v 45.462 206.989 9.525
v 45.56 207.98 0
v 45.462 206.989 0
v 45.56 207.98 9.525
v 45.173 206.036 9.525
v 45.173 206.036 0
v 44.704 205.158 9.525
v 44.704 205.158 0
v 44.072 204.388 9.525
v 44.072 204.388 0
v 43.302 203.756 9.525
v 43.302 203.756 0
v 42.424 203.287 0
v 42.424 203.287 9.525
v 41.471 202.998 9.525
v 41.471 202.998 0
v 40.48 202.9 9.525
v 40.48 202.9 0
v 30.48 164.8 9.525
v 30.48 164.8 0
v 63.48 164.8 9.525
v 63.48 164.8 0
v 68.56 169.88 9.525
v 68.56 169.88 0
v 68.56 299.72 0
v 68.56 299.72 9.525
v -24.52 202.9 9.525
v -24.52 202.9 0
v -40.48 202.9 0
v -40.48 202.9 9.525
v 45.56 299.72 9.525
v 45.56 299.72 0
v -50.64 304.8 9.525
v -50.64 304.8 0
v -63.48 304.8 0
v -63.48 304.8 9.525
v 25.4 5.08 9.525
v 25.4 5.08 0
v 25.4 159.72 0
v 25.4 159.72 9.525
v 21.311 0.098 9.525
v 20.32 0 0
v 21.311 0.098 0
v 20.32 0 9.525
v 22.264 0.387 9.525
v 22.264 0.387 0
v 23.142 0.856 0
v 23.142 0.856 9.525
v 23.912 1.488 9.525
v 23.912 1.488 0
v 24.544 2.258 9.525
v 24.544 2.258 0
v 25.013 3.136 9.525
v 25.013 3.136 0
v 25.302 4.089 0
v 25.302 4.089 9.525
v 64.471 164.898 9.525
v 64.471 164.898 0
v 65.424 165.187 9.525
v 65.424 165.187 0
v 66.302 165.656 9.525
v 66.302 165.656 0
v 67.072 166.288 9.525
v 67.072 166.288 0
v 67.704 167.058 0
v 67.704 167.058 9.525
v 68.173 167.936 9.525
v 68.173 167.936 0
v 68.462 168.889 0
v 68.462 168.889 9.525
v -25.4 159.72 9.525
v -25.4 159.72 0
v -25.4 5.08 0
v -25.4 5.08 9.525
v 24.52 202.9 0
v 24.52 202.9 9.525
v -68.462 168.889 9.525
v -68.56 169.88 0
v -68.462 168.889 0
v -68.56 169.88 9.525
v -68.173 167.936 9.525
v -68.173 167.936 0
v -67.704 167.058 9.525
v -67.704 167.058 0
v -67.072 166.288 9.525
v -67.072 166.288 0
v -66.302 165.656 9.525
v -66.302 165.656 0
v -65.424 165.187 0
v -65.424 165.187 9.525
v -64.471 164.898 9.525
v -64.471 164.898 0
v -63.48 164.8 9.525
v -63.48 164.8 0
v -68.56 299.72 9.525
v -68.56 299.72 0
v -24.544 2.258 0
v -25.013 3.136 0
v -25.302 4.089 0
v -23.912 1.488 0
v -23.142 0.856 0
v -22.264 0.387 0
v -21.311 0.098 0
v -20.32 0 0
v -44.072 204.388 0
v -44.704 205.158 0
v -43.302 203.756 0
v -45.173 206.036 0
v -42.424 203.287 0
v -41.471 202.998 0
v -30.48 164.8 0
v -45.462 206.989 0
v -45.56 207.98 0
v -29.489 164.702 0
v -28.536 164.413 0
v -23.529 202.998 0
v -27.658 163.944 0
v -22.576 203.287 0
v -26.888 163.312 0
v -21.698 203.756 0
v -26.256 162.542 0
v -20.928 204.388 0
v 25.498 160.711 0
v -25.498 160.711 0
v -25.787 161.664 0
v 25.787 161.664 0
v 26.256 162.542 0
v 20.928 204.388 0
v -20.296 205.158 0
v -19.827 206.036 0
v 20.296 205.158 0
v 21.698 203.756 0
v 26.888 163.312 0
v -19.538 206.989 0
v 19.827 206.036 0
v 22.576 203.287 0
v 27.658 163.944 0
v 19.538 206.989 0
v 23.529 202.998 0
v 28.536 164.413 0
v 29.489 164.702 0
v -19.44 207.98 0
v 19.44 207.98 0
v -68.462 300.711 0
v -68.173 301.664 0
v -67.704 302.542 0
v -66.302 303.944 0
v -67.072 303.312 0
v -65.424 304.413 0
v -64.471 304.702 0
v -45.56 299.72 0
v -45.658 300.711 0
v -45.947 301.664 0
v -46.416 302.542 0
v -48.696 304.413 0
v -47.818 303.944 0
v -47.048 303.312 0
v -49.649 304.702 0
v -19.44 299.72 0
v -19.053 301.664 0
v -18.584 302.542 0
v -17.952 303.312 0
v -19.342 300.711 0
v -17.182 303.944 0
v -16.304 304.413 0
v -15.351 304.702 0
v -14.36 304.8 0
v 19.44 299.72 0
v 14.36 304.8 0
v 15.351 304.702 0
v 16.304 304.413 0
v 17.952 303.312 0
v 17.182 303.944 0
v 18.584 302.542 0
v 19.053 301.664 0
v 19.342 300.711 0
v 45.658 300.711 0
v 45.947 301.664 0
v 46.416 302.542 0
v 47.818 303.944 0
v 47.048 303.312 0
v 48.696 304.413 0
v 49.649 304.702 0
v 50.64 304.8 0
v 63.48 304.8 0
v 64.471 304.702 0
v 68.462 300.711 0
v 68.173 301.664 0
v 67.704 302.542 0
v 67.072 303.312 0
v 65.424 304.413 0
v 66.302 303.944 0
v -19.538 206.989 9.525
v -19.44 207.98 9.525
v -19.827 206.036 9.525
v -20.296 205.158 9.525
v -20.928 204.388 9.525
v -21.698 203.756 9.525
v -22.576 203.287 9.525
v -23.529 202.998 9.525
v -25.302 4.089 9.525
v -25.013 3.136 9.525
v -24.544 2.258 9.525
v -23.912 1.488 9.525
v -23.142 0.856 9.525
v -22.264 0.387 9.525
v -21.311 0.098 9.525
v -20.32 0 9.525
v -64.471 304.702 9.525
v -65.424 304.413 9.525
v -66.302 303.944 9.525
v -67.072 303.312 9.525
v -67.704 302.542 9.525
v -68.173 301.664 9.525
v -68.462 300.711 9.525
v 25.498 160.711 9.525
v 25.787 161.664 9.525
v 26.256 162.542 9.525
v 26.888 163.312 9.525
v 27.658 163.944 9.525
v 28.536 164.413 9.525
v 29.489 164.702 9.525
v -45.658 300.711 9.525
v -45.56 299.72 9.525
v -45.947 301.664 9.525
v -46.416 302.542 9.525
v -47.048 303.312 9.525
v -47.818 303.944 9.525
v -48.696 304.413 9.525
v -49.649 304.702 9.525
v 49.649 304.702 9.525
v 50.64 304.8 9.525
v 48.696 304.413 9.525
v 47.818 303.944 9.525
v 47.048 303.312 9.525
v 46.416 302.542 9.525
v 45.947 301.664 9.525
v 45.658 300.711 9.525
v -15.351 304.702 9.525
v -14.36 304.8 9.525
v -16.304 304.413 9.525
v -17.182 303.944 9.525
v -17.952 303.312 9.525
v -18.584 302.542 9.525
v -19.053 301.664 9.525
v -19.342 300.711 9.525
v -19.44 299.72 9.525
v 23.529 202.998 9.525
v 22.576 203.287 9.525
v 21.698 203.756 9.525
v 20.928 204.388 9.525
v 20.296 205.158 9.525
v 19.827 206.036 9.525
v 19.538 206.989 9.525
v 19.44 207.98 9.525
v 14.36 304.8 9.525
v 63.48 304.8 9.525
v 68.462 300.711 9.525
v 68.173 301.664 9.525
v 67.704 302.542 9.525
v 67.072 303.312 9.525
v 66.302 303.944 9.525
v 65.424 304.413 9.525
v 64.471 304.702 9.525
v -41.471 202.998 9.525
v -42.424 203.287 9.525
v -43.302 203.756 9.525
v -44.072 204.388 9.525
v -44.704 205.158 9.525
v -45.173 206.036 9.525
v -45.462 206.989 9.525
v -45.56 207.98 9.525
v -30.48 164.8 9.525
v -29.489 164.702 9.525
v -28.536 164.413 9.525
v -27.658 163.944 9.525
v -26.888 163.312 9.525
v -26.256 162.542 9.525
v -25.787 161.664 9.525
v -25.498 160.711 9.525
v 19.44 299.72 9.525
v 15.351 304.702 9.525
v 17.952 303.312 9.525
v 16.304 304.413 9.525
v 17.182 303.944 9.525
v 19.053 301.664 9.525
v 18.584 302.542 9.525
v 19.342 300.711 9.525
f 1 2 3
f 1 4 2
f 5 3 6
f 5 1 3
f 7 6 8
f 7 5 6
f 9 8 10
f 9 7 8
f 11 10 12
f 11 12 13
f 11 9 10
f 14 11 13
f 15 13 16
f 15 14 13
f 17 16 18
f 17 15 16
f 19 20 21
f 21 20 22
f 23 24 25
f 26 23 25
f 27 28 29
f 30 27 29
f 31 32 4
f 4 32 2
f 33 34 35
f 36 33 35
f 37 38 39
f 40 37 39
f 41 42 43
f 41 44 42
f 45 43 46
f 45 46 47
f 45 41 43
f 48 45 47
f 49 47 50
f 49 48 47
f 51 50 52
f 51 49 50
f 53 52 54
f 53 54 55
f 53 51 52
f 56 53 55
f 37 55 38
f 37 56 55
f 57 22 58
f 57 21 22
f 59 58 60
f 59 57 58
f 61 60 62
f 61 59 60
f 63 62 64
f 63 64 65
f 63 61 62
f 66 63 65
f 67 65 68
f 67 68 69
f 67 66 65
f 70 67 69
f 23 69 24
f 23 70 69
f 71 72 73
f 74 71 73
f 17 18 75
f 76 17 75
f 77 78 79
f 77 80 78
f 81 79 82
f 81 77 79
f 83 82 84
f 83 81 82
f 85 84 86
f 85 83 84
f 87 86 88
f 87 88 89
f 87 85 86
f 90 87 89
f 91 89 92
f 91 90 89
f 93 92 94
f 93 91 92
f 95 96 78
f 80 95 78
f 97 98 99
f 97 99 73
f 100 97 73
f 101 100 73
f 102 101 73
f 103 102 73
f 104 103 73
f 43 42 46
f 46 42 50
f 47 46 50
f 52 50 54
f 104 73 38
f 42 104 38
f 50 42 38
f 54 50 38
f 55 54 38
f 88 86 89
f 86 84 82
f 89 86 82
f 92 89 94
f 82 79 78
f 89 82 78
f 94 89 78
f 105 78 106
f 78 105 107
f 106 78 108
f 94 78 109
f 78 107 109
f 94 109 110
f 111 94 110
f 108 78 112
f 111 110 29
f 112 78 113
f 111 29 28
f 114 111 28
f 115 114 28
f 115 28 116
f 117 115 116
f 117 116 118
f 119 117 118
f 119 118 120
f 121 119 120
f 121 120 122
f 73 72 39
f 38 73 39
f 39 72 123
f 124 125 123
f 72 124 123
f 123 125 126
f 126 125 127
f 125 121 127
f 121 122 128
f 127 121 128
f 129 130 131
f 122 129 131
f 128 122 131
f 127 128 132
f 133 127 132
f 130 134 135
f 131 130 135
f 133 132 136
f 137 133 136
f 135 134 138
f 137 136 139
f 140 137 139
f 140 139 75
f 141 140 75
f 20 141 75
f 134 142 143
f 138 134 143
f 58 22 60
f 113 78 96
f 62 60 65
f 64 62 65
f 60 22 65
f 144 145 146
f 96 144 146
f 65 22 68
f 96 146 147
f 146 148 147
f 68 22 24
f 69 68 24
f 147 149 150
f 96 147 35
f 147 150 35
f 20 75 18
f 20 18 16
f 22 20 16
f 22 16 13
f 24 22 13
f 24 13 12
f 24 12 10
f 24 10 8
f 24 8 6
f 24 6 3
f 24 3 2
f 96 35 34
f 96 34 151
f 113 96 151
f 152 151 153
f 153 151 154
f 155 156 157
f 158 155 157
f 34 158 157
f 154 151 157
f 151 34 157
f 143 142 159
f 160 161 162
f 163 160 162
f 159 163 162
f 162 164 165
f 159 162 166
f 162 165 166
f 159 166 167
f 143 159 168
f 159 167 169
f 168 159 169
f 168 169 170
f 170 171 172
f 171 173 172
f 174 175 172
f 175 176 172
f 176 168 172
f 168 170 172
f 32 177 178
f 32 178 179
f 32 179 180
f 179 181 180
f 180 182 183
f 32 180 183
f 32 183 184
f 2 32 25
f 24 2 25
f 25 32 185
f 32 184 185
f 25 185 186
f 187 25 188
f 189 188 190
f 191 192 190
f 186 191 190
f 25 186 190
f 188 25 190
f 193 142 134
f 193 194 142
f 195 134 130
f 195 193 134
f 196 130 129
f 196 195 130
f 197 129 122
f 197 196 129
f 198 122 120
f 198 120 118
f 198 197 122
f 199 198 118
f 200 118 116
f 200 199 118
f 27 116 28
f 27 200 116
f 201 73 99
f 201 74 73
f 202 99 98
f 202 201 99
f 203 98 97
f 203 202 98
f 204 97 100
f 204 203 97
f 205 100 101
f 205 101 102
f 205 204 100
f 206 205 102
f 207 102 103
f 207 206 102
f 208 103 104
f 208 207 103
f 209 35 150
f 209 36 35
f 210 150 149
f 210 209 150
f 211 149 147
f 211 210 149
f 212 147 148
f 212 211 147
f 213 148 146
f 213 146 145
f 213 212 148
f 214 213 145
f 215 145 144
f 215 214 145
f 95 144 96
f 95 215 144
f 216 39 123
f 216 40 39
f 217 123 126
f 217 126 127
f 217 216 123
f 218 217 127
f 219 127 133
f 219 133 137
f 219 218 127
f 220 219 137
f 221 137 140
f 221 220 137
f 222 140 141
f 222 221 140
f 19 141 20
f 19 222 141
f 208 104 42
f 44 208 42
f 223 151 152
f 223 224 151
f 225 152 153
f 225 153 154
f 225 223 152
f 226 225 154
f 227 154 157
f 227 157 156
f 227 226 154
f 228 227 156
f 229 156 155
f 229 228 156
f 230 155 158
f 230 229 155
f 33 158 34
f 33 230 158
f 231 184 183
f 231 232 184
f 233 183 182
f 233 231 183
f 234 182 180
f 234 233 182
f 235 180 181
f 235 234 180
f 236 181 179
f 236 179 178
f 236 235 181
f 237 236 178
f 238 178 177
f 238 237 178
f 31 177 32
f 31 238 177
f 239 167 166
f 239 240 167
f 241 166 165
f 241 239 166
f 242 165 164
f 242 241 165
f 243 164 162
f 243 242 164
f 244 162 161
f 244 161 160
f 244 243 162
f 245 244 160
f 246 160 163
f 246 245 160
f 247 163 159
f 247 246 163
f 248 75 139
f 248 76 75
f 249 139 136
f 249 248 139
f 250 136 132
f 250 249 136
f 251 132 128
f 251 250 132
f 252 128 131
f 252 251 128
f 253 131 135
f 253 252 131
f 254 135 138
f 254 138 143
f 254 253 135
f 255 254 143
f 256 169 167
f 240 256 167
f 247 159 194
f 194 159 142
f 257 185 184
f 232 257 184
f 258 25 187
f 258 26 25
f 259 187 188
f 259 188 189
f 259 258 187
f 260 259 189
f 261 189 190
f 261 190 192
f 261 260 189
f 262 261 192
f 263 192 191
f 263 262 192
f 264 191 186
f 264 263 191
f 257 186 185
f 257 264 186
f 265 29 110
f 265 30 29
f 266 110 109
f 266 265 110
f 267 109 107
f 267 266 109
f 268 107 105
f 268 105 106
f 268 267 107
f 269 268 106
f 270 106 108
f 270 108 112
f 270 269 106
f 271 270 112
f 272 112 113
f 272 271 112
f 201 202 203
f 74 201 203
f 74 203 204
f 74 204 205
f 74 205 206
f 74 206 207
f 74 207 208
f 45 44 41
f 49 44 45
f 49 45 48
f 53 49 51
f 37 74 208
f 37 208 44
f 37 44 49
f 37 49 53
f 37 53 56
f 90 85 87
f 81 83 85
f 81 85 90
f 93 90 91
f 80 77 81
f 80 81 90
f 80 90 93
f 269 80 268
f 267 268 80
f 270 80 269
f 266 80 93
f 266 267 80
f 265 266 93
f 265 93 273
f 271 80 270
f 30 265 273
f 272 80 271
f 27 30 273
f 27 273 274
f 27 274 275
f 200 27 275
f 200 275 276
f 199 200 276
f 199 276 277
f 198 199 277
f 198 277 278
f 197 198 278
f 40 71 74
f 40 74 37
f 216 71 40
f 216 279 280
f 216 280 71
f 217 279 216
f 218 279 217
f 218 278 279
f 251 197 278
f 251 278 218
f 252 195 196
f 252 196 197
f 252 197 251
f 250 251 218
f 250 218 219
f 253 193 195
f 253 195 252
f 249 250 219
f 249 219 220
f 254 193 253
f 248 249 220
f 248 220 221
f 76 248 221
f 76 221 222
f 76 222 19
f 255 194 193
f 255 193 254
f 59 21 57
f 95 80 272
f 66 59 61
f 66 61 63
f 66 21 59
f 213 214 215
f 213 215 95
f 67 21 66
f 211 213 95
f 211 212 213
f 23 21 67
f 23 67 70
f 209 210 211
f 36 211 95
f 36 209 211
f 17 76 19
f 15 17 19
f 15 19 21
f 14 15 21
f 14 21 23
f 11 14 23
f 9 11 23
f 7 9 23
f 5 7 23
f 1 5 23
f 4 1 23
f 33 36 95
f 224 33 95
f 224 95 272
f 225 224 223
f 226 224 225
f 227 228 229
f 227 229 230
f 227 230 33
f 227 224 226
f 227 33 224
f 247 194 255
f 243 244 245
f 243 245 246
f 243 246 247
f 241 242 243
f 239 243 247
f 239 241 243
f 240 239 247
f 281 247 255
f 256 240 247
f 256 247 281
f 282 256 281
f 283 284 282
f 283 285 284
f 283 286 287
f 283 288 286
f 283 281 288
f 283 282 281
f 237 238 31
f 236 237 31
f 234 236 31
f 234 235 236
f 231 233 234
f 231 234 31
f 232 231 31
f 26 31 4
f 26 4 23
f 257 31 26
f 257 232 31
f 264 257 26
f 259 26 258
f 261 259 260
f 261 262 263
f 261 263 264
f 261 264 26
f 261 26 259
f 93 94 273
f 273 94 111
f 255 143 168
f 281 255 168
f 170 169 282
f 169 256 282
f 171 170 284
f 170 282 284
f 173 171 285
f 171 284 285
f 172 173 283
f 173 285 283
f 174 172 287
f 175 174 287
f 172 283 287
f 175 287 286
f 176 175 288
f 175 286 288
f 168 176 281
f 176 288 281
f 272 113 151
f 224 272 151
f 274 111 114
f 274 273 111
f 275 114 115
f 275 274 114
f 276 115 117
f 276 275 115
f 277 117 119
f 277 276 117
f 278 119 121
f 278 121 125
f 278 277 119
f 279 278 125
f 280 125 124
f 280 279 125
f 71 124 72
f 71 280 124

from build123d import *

# Parameters (mm, degrees)
F1_DEPTH = 9.525
F2_R     = 5.08


# Not quite as in the source:
# - a length typed as a fraction of an inch, garbled in the dataset ("3 / 203.2 mm" for 3/8 in), is restored


with BuildPart() as f1:
    # F0 (on Top) → F1 (new body)
    with BuildSketch(Plane.XY):
        Polygon((19.44, 304.8), (0, 304.8), (-19.44, 304.8), (-19.44, 202.9), (-45.56, 202.9), (-45.56, 304.8), (-68.56, 304.8), (-68.56, 164.8), (-25.4, 164.8), (-25.4, 0), (0, 0), (25.4, 0), (25.4, 164.8), (68.56, 164.8), (68.56, 304.8), (45.56, 304.8), (45.56, 202.9), (19.44, 202.9), align=None)
    extrude(amount=F1_DEPTH)

    # F2
    f2_edges = [f1.edges().sort_by_distance(p)[0] for p in [
        (68.56, 304.8, 4.7625),
        (45.56, 304.8, 4.7625),
        (19.44, 304.8, 4.7625),
        (-19.44, 304.8, 4.7625),
        (-45.56, 304.8, 4.7625),
        (-68.56, 304.8, 4.7625),
        (68.56, 164.8, 4.7625),
        (-25.4, 164.8, 4.7625),
        (-68.56, 164.8, 4.7625),
        (-45.56, 202.9, 4.7625),
        (19.44, 202.9, 4.7625),
        (-19.44, 202.9, 4.7625),
        (45.56, 202.9, 4.7625),
        (25.4, 164.8, 4.7625),
        (25.4, 0, 4.7625),
        (-25.4, 0, 4.7625),
    ]]
    fillet(f2_edges, radius=F2_R)


solid = f1.part
